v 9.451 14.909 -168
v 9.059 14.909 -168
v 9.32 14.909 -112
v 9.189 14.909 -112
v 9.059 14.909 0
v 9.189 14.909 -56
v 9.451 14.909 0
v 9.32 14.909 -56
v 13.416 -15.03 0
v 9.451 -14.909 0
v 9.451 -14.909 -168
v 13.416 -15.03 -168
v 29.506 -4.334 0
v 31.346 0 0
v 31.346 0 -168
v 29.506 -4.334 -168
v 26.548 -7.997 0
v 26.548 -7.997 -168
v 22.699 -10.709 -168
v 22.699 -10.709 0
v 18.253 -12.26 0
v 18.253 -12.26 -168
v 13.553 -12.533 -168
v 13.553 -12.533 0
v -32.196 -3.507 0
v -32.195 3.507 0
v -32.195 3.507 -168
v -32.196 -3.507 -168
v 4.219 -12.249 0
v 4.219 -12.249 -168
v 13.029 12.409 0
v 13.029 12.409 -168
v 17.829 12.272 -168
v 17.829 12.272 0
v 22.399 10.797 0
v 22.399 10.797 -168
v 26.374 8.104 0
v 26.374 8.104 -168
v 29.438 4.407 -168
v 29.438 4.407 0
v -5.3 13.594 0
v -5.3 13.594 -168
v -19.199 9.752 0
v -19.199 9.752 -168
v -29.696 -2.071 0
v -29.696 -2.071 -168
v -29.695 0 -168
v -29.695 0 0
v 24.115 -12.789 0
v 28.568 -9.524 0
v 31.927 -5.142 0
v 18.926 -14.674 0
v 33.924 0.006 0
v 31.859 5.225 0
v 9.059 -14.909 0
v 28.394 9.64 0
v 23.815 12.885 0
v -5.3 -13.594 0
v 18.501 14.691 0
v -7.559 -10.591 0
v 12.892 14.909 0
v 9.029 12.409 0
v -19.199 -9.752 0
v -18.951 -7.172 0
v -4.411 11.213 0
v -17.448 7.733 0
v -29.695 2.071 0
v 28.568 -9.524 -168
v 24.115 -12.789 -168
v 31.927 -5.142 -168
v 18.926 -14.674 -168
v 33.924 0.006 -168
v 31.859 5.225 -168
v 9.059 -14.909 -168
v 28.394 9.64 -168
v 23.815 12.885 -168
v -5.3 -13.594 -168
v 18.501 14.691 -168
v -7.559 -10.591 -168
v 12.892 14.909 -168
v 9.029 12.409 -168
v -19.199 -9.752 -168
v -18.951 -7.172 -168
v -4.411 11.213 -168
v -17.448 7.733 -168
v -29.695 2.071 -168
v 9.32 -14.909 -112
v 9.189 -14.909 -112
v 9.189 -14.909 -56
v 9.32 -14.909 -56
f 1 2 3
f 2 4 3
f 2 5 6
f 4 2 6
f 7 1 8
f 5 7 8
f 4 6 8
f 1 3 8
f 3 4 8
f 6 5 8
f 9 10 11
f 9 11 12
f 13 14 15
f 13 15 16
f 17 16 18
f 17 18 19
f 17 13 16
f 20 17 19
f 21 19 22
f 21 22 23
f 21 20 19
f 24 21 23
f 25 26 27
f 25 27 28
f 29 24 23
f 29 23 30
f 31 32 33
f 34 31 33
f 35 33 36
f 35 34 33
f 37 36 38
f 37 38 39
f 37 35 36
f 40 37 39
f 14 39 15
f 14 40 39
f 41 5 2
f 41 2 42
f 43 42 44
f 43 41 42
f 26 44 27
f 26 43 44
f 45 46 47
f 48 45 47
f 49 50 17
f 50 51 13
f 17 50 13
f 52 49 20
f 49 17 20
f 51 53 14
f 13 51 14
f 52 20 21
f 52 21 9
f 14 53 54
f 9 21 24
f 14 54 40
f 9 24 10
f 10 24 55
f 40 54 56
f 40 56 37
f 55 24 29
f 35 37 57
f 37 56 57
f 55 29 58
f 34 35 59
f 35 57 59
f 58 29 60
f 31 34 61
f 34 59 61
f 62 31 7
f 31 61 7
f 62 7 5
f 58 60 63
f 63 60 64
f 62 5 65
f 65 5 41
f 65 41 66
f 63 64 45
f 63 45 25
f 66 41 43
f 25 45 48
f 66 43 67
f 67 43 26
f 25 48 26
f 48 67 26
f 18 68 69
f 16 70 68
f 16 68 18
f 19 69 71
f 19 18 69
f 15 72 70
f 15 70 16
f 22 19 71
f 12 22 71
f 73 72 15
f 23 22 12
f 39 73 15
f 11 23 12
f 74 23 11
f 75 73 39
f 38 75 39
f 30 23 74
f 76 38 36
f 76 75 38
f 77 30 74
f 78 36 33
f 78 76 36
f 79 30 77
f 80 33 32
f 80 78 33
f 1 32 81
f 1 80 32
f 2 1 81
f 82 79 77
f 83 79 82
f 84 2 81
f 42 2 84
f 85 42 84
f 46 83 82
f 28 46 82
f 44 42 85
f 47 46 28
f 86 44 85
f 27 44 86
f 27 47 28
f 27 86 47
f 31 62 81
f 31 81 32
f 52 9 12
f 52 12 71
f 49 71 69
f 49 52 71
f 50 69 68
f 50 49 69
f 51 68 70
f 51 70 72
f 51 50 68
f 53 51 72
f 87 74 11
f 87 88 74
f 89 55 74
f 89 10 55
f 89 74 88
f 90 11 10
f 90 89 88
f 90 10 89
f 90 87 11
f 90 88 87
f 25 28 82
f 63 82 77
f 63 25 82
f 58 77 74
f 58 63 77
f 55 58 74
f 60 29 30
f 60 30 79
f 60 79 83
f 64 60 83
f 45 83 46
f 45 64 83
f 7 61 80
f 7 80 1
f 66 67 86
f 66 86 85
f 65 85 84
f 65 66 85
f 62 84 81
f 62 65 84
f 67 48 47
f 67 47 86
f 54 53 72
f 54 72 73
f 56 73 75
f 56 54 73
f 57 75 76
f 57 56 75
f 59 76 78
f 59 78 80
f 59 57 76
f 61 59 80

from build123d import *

# Parameters (mm, degrees)
F1_DEPTH = 168


# Not quite as in the source:
# - a feature names something its author has since deleted; it is built from what else it names


with BuildPart() as f1:
    # F0 (on Top) → F1 (new body)
    with BuildSketch(Plane.XY):
        with BuildLine():
            add(Edge.make_bspline(
                [(9.0589725163, 14.9090803276), (9.1893761129, 14.9089854783), (9.3201289556, 14.9089586218), (9.4512325362, 14.909)],
                knots=[108.3727376298, 108.3727376298, 108.3727376298, 108.3727376298, 108.6044995707, 108.6044995707, 108.6044995707, 108.6044995707], degree=3))
            ThreePointArc((9.0589725163, 14.9090803276), (-12.3350874174, 11.9828700727), (-32.1953748348, 3.5071700662))
            Line((-32.1953748348, 3.5071700662), (-32.1954637008, 6.33471e-05))
            Line((-32.1954637008, 6.33471e-05), (-32.1955525689, -3.5071262621))
            ThreePointArc((-32.1955525689, -3.5071262621), (-12.3352527385, -11.9828512354), (9.0588260182, -14.9090804342))
            add(Edge.make_bspline(
                [(9.0588260182, -14.9090804342), (9.1892781859, -14.9089854984), (9.3200798608, -14.9089586063), (9.4512325362, -14.909)],
                knots=[108.372650841, 108.372650841, 108.372650841, 108.372650841, 108.6044995707, 108.6044995707, 108.6044995707, 108.6044995707], degree=3))
            Line((9.4512325362, -14.909), (13.4156349212, -15.0296401869))
            ThreePointArc((13.4156349212, -15.0296401869), (26.4575983511, -11.3147653424), (33.9237386916, 0.0055638769))
            ThreePointArc((33.9237386916, 0.0055638769), (26.221744338, 11.4277863656), (12.8924894738, 14.909))
            Line((12.8924894738, 14.909), (9.4512325362, 14.909))
        make_face()
        with BuildLine():
            Line((-29.6955161871, -2.0713442572), (-29.6954637016, 0))
            Line((-29.6954637016, 0), (-29.6954112161, 2.0713449993))
            ThreePointArc((-29.6954112161, 2.0713449993), (-11.0041823718, 9.7538427825), (9.0291136139, 12.409))
            Line((9.0291136139, 12.409), (13.0291136139, 12.409))
            ThreePointArc((13.0291136139, 12.409), (24.4821941123, 9.5918072896), (31.3456378974, 0))
            ThreePointArc((31.3456378974, 0), (24.7175372439, -9.4867852182), (13.5527042793, -12.5326540468))
            Line((13.5527042793, -12.5326540468), (4.2194331318, -12.2486345488))
            ThreePointArc((4.2194331318, -12.2486345488), (-13.3194868099, -9.0976060688), (-29.6955161871, -2.0713442572))
        make_face(mode=Mode.SUBTRACT)
    extrude(amount=-F1_DEPTH)


solid = f1.part
